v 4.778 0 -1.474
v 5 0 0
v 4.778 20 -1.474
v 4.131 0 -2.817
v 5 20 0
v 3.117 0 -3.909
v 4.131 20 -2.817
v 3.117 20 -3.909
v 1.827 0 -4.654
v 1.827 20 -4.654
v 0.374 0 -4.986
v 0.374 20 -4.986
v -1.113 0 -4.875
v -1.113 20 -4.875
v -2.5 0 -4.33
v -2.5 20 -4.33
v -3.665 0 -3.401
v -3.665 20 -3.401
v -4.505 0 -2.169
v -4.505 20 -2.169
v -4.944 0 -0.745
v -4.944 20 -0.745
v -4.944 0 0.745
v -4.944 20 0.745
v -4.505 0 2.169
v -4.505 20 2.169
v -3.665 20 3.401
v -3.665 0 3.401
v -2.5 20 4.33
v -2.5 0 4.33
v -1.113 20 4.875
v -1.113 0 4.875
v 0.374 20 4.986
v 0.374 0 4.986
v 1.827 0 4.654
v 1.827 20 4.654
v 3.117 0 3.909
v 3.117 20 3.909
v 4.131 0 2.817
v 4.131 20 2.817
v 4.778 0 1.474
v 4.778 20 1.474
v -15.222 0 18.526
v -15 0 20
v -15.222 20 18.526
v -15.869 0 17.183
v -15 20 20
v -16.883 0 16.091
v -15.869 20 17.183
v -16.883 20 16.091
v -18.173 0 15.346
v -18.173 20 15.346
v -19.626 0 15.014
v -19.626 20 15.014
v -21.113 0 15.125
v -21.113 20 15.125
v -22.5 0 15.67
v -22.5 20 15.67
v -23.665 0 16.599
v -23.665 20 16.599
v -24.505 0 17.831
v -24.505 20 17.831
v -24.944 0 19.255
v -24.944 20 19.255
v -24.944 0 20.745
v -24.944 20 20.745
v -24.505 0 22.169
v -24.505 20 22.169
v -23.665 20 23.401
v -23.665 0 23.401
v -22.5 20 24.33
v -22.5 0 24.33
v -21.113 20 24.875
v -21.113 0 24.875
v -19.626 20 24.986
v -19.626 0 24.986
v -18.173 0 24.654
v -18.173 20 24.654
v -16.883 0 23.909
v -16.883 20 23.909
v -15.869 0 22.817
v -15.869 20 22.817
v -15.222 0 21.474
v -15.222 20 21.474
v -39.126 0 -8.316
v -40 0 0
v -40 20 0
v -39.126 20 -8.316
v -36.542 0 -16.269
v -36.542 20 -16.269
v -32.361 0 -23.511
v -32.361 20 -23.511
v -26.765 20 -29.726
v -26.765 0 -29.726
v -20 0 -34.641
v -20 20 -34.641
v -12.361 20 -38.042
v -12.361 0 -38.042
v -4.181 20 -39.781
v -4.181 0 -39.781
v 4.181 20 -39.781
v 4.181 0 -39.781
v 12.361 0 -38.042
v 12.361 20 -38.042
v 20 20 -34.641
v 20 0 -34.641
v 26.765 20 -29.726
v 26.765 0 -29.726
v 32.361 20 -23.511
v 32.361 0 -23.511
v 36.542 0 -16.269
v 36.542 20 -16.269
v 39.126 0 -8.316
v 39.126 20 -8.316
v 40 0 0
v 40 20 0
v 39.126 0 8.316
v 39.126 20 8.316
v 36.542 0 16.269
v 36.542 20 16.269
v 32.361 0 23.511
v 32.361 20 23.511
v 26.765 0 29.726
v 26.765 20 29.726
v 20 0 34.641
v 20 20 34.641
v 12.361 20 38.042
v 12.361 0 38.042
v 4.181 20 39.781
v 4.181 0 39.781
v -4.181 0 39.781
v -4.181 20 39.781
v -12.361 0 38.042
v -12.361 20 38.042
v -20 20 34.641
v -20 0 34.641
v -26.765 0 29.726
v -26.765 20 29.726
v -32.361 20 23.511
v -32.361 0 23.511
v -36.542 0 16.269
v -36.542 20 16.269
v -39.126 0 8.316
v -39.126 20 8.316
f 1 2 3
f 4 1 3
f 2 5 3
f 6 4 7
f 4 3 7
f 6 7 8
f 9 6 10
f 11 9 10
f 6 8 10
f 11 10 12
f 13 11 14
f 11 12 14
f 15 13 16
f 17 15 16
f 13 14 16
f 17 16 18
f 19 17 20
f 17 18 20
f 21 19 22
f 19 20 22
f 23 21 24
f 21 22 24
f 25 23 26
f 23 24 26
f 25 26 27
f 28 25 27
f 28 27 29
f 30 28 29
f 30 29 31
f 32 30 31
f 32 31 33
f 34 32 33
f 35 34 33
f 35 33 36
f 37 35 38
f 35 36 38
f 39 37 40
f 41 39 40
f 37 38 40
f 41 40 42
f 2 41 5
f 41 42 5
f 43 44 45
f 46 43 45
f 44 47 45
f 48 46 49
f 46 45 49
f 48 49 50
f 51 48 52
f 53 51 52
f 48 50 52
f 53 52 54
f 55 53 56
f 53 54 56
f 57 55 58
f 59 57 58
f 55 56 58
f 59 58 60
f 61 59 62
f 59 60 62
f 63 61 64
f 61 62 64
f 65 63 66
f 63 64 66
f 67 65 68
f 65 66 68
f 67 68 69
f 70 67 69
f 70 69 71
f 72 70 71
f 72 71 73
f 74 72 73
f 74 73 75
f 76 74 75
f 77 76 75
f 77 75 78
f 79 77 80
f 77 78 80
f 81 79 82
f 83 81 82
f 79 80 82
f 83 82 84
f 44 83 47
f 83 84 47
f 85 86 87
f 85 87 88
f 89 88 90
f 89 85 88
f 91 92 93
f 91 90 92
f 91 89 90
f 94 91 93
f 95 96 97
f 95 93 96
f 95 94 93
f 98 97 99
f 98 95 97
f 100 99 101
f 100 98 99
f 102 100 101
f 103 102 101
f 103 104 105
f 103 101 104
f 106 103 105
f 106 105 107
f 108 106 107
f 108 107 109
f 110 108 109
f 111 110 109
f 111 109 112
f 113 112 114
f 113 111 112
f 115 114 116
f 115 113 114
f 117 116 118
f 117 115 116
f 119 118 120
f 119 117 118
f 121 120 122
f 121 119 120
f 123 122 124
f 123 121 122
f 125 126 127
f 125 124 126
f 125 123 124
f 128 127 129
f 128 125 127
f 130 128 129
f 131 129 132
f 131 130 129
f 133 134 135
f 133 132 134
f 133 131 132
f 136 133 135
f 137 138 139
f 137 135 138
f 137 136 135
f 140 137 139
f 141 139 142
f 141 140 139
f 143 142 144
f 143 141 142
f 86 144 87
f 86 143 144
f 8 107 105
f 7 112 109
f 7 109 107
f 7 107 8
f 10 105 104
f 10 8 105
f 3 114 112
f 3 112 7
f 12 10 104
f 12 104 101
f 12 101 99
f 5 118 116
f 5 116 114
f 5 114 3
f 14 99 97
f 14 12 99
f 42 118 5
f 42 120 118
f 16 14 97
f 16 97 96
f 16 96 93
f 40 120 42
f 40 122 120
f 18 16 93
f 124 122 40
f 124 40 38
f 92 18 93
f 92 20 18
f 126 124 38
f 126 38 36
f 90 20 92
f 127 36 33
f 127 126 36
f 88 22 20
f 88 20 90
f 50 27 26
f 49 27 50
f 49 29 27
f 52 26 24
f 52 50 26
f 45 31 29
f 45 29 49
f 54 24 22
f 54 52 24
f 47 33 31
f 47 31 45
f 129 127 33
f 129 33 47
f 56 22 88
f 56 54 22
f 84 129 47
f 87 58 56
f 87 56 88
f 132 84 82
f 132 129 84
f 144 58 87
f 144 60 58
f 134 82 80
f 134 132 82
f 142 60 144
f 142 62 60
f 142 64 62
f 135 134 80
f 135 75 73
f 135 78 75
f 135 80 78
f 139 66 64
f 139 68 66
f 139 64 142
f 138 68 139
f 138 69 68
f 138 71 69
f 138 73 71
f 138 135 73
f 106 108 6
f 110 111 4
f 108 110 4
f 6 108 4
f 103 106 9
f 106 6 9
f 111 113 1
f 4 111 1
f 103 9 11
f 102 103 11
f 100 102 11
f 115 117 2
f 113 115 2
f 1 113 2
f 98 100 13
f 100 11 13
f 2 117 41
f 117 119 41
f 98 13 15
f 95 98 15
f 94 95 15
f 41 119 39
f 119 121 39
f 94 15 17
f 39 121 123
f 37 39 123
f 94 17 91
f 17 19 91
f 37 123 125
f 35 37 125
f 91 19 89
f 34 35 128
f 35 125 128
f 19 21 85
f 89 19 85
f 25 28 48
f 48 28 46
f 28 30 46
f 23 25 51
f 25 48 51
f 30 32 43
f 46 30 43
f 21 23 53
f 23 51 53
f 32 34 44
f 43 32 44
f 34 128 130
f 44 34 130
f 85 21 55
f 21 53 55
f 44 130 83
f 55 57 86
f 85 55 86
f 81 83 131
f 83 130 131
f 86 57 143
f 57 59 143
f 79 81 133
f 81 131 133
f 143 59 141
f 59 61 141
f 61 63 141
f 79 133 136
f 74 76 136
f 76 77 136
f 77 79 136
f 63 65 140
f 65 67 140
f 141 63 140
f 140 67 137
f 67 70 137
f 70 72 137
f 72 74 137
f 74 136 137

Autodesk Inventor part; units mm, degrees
ref_plane "YZ Plane" through (0, 0, 0) normal (1, 0, 0) x (0, 1, 0)
ref_plane "XZ Plane" through (0, 0, 0) normal (0, 1, 0) x (-1, 0, 0)
ref_plane "XY Plane" through (0, 0, 0) normal (0, 0, 1) x (1, 0, 0)
sketch "Sketch1" plane through (0, 0, 0) normal (0, 1, 0) x (-1, 0, 0)
  circle A0 centre (0, 0) radius 40
  dimension "d0" = 80
extrude "Extrusion1" add sketch "Sketch1" along normal blind 20
sketch "Sketch2" plane through (0, 20, 0) normal (0, 1, 0) x (1, 0, 0)
  circle A0 centre (0, 0) radius 40 projected
  line L0 (-56, 0) -> (56, 0) projected
  line L1 (0, 56) -> (0, -56) projected
  circle A1 centre (-20, -20) radius 5
  dimension "d3" = 10
  dimension "d4" = 20
  dimension "d5" = 20
extrude "Extrusion2" cut sketch "Sketch2" against normal through all contours A1
sketch "Sketch3" plane through (0, 20, 0) normal (0, 1, 0) x (1, 0, 0)
  circle A0 centre (0, 0) radius 5
  dimension "d8" = 10
extrude "Extrusion3" cut sketch "Sketch3" against normal through all
equation "\"d6\" = d3"
equation "\"d9\" = d3"
properties part number "flywheel"
